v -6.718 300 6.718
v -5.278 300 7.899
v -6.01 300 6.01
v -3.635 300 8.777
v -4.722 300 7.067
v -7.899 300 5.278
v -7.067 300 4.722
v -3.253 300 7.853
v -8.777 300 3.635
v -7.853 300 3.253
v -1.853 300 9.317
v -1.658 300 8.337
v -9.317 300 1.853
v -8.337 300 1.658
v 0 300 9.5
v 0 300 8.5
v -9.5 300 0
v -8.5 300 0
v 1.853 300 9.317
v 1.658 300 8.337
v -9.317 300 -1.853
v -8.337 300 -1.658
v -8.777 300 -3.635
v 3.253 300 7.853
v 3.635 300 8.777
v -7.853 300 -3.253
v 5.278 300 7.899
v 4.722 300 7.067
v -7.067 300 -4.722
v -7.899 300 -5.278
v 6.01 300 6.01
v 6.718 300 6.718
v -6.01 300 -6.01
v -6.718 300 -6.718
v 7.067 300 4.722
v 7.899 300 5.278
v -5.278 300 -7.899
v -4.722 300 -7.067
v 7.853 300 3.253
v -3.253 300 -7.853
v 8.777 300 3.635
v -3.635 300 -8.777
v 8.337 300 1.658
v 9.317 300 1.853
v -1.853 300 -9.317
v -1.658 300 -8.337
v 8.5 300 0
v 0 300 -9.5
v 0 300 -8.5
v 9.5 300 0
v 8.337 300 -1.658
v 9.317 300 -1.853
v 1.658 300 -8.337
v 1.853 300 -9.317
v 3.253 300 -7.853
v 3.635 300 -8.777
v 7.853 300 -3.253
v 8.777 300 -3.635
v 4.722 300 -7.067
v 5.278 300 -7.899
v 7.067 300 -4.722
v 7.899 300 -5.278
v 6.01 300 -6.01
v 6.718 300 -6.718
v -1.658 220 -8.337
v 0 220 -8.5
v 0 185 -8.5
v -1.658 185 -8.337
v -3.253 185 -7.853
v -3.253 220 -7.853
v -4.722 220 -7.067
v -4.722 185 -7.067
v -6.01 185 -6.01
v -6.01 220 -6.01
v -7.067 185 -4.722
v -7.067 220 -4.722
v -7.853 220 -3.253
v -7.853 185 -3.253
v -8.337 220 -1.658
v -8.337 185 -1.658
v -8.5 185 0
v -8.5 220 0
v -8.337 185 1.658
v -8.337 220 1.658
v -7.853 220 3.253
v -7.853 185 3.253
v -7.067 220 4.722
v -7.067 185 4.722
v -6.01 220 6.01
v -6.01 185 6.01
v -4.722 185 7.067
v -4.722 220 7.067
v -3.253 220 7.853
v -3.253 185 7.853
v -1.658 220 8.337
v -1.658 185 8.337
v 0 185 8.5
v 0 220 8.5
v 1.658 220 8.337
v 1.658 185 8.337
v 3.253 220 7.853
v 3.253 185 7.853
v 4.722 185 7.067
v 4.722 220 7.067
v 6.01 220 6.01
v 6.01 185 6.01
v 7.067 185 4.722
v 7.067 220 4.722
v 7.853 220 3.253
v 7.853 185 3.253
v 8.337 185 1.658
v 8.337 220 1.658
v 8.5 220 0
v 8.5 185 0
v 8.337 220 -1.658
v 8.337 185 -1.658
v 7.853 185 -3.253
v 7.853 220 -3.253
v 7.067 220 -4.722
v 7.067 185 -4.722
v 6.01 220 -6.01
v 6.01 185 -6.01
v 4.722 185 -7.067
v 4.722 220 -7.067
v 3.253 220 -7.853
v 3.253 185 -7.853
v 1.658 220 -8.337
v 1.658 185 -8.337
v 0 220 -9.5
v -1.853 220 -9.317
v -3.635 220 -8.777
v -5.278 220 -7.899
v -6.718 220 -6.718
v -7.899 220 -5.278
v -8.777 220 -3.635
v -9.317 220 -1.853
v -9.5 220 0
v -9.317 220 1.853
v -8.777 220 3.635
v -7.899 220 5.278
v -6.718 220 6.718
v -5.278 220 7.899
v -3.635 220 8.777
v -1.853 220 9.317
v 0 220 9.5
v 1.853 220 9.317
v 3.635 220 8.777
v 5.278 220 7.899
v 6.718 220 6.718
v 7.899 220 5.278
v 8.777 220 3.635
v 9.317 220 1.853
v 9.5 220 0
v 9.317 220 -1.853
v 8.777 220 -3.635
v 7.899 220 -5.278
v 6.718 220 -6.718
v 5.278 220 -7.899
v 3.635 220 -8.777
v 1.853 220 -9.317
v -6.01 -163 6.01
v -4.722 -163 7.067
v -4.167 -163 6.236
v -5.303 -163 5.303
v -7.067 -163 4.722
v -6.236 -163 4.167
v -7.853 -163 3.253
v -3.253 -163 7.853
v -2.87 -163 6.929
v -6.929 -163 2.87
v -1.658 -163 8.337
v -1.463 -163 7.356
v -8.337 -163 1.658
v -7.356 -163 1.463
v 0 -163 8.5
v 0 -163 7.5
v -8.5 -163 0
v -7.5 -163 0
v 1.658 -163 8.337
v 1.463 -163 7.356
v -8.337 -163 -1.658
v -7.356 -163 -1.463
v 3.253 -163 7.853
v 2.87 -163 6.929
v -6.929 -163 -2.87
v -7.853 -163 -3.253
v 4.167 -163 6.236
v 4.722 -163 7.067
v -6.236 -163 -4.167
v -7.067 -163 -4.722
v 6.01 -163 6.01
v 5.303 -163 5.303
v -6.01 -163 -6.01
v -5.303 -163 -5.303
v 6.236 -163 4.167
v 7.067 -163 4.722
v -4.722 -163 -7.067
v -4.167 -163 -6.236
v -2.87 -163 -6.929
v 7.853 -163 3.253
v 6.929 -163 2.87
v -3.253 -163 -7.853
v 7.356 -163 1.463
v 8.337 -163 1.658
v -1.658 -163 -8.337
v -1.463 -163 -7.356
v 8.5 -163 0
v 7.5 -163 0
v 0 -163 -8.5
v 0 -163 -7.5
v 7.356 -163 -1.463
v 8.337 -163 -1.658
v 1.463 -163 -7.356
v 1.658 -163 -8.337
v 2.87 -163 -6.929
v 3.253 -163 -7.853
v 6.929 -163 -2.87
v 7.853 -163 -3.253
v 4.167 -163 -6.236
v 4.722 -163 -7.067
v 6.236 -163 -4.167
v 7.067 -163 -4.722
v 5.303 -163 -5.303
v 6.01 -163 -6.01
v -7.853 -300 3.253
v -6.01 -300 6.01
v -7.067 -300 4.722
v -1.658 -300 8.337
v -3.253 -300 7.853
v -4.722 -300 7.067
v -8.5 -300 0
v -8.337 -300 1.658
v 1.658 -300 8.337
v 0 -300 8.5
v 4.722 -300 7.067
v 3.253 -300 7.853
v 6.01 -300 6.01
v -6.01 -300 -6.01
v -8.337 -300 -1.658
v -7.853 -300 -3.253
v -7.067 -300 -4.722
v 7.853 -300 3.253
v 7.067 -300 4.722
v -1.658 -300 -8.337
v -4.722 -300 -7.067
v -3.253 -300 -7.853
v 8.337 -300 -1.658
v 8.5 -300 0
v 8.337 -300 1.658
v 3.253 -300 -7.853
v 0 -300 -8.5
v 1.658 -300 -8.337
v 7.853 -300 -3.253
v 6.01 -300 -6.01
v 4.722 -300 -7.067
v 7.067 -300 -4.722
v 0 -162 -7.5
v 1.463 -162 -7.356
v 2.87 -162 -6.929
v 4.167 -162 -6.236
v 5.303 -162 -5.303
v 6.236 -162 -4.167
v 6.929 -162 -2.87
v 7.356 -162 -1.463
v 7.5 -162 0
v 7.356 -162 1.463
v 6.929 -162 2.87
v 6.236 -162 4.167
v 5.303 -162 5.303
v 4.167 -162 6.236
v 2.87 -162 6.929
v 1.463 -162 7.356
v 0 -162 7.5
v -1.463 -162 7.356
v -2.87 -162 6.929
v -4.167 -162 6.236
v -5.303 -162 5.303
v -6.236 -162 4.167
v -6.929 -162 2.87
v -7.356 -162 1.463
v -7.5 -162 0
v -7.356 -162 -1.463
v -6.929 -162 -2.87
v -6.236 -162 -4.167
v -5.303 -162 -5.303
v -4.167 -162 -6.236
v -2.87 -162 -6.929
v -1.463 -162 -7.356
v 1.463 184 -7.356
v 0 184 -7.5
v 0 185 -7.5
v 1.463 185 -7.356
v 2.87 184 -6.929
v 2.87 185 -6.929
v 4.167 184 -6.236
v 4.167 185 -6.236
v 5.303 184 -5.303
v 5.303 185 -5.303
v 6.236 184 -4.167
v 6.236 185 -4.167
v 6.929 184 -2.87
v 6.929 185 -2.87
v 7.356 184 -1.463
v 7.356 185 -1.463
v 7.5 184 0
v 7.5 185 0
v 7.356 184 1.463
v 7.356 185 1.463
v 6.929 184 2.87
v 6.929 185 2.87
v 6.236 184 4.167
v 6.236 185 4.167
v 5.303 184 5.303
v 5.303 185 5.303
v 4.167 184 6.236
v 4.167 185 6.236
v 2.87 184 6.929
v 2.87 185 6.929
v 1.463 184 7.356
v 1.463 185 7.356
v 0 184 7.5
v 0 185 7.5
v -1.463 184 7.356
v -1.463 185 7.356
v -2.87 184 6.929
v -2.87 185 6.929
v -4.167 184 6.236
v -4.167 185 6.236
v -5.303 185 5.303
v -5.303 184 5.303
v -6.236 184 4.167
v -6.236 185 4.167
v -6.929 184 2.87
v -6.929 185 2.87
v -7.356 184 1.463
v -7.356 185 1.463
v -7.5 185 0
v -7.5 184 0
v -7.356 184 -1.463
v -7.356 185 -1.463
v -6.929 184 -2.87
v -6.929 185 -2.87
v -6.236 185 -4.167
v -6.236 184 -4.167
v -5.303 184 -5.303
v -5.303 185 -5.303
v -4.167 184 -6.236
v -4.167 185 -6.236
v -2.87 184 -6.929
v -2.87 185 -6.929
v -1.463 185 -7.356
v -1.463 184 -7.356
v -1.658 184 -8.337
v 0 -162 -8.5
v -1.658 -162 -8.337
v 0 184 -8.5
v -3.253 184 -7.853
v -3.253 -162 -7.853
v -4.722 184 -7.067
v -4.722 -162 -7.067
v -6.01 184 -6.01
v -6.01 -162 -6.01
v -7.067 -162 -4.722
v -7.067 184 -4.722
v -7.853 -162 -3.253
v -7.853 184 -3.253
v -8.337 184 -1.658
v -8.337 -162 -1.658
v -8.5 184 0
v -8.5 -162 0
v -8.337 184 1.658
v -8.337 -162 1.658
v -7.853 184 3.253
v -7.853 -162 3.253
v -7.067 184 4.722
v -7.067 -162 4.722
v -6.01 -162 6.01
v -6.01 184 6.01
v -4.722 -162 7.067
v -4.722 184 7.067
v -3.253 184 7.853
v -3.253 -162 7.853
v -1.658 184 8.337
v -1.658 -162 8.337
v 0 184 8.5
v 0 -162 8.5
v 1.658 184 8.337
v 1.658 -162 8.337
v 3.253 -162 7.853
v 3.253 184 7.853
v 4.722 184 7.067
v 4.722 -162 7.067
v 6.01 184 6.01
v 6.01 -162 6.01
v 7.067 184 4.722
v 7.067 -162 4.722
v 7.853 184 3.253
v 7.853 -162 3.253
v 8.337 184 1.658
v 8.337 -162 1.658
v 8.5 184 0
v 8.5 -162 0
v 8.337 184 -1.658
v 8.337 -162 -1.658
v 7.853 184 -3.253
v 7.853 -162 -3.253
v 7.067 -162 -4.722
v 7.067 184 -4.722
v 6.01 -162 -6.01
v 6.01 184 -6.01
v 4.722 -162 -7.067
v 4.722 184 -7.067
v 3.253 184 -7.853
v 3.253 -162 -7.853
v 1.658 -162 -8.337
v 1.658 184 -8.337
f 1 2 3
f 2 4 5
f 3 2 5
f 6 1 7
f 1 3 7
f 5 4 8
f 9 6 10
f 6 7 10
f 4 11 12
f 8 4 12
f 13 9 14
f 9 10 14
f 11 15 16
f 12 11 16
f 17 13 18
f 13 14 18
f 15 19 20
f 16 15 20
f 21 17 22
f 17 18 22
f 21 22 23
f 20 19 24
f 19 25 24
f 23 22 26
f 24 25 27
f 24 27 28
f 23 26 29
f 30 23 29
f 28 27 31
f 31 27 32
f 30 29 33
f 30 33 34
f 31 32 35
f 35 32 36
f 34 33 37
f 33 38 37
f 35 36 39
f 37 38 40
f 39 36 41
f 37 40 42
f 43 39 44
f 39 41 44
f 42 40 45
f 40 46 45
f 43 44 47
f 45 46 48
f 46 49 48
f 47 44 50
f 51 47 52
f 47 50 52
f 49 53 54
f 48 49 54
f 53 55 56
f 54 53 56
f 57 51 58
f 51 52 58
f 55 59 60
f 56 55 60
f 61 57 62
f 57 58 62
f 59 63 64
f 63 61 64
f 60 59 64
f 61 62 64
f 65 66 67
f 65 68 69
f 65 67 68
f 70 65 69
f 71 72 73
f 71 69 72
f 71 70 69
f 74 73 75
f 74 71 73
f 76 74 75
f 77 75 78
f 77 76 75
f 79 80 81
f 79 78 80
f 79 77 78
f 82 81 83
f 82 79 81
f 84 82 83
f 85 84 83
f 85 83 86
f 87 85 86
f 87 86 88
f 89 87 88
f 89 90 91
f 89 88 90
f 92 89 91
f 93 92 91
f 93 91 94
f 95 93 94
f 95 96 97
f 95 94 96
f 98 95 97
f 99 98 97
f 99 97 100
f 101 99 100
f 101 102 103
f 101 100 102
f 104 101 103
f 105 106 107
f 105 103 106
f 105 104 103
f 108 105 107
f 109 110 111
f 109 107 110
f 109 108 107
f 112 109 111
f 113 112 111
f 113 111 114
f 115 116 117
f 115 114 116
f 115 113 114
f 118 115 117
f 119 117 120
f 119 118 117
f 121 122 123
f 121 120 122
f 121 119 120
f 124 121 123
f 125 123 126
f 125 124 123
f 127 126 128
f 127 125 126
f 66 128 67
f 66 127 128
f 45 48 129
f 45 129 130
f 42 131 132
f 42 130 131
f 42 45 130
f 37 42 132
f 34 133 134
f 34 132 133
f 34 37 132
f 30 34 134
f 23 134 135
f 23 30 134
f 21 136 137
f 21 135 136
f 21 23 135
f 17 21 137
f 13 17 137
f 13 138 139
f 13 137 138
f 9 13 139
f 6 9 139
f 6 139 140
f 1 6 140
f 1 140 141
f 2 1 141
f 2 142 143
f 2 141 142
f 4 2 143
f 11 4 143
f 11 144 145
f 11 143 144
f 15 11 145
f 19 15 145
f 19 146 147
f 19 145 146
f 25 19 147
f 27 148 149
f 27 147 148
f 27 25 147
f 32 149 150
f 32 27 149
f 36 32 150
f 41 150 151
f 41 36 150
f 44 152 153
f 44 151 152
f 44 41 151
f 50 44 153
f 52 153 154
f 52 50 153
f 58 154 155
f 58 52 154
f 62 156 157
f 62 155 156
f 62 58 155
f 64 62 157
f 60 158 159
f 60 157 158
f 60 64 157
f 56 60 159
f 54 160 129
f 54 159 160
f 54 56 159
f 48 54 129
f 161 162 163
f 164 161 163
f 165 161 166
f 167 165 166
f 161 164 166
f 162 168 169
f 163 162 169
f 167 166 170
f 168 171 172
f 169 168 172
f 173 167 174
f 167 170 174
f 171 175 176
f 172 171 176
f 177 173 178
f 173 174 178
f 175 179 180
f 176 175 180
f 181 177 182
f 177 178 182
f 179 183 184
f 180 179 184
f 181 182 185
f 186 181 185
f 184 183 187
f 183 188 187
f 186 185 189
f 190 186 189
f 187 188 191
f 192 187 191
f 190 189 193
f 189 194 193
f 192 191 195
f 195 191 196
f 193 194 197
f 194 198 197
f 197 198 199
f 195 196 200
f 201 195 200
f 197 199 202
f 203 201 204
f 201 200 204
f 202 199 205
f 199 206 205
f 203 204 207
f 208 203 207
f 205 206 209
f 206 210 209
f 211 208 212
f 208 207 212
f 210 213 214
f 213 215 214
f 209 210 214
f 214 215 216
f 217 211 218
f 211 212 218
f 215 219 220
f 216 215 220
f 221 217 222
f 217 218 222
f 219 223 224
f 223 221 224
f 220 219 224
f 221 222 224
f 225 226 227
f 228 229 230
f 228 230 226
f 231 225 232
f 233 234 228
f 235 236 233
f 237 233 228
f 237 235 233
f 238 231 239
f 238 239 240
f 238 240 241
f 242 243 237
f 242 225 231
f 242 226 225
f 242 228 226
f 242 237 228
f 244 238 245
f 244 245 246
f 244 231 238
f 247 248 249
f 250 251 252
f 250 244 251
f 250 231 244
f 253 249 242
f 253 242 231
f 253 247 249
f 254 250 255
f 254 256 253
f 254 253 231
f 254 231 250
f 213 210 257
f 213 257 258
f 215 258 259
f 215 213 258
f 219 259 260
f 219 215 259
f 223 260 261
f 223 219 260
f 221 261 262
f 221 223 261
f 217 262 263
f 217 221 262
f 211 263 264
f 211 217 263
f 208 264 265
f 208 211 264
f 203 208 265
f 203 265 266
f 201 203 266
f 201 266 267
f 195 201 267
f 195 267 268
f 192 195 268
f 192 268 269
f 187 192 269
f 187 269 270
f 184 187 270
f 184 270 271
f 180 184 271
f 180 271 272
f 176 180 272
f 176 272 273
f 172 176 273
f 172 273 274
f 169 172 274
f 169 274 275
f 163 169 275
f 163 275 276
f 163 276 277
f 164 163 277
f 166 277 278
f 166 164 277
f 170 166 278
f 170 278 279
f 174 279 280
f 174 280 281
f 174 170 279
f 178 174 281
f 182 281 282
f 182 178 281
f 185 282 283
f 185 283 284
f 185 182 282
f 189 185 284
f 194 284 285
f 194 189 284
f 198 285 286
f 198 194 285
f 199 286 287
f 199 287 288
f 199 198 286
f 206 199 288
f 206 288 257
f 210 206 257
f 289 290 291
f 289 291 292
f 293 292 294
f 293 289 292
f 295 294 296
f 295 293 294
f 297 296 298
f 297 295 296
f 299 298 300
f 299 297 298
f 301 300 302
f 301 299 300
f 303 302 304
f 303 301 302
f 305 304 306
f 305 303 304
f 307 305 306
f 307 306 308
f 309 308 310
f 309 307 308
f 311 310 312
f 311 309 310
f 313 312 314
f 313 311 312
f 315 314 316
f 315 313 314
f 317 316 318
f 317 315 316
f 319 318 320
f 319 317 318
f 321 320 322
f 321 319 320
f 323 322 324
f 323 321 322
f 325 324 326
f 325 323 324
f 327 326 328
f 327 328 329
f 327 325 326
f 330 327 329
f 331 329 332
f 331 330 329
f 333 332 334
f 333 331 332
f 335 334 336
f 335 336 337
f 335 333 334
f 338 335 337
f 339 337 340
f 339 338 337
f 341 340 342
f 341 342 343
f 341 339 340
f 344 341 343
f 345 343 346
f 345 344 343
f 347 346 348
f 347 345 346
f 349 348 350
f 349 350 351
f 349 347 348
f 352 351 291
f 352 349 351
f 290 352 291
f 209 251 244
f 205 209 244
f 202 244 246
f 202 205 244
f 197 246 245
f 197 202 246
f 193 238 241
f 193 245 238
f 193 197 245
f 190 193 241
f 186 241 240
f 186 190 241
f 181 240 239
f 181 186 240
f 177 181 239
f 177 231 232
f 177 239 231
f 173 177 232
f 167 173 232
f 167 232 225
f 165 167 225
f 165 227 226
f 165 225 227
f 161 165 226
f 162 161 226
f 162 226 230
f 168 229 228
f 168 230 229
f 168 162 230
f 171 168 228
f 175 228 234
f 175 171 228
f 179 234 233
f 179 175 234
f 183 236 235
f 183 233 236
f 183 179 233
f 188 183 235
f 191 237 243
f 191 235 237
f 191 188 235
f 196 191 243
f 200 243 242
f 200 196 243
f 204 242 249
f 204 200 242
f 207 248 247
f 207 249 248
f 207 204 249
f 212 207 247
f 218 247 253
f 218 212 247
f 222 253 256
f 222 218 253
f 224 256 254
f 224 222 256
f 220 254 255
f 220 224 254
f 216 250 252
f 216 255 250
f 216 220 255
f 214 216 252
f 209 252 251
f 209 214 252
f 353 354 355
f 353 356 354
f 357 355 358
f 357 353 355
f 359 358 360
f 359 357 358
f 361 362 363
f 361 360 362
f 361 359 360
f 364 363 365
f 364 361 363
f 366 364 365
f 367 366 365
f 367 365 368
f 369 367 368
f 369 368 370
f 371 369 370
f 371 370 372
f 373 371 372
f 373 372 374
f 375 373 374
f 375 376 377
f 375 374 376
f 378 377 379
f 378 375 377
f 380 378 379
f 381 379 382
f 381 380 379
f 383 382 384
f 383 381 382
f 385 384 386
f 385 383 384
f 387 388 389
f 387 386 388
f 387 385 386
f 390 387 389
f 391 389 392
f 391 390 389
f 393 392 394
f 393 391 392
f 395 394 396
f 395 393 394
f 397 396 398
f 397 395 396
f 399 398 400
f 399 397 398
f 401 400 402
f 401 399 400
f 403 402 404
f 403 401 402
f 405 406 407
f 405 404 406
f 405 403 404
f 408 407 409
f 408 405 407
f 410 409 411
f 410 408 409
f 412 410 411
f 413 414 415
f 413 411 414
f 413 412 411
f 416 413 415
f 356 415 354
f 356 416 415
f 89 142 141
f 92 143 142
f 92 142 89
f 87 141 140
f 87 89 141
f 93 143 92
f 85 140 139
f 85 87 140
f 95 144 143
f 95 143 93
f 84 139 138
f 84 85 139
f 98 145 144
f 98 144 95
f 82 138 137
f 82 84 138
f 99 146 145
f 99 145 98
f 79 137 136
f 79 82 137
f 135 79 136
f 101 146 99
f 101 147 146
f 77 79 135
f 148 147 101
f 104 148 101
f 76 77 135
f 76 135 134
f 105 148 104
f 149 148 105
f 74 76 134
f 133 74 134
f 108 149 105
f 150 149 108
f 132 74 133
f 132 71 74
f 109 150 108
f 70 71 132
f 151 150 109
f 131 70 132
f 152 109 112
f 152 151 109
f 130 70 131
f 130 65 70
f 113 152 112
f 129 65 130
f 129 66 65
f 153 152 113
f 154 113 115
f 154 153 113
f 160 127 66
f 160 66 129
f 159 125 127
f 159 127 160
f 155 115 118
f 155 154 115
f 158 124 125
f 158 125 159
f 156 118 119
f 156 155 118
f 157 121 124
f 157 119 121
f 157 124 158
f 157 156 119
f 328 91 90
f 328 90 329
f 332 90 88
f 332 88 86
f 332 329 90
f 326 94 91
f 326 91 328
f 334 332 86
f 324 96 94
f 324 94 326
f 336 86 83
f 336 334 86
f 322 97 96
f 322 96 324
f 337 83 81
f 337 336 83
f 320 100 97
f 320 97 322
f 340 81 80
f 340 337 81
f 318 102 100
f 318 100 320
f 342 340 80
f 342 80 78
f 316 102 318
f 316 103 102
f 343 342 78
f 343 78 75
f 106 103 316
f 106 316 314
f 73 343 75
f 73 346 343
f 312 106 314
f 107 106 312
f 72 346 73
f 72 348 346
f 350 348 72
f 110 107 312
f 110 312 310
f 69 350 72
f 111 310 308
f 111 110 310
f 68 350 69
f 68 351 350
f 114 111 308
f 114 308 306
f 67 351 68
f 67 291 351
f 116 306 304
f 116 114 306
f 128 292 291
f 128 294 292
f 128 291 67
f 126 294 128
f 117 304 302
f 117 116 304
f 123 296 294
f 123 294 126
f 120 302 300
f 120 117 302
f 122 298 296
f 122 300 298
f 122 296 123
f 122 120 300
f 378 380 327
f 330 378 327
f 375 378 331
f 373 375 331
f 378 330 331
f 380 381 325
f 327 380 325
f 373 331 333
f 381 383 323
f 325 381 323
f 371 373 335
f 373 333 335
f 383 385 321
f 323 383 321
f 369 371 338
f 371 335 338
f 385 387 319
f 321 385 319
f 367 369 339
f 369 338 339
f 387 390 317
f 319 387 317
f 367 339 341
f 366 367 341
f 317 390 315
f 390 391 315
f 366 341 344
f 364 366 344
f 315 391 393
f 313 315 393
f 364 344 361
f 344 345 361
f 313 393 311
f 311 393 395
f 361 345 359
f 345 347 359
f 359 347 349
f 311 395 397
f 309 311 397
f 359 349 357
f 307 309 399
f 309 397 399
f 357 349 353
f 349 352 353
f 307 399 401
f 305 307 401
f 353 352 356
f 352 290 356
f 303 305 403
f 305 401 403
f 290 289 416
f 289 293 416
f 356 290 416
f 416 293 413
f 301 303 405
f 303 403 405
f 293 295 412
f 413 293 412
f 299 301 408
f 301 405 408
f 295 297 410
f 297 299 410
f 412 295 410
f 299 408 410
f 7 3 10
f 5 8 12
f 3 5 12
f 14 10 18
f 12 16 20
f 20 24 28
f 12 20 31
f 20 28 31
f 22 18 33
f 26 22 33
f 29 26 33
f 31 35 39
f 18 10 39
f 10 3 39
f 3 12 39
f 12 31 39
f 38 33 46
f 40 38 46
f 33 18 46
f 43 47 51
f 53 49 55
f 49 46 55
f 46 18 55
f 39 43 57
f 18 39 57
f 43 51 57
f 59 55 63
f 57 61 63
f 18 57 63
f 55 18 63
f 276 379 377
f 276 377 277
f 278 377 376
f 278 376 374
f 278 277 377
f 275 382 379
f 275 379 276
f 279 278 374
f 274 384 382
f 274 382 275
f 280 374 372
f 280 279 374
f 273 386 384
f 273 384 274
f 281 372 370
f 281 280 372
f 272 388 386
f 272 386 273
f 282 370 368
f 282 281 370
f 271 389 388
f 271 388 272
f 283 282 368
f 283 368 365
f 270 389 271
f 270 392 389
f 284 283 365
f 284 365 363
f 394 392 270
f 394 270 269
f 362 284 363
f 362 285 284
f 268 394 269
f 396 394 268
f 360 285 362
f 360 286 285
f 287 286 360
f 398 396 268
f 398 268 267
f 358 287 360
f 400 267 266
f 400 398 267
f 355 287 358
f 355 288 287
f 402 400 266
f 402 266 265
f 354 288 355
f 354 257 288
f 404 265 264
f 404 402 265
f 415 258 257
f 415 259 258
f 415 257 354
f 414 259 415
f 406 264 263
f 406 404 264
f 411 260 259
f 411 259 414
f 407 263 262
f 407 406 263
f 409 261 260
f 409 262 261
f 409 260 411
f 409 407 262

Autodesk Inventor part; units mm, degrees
ref_plane "YZ Plane" through (0, 0, 0) normal (1, 0, 0) x (0, 1, 0)
ref_plane "XZ Plane" through (0, 0, 0) normal (0, 1, 0) x (-1, 0, 0)
ref_plane "XY Plane" through (0, 0, 0) normal (0, 0, 1) x (1, 0, 0)
sketch "Sketch1" plane through (0, 0, 0) normal (1, 0, 0) x (0, 1, 0)
  line L0 (300, 0) -> (-300, 0)
  line L1 (-300, 0) -> (-300, -8.5)
  line L2 (-300, -8.5) -> (-163, -8.5)
  line L3 (300, -8.5) -> (300, 0)
  line L4 (185, -8.5) -> (185, -7.5)
  line L5 (185, -7.5) -> (184, -7.5)
  line L6 (184, -7.5) -> (184, -8.5)
  line L7 (-162, -7.5) -> (-163, -7.5)
  line L8 (-163, -7.5) -> (-163, -8.5)
  line L9 (-163, -8.5) -> (-162, -8.5) construction
  line L10 (-162, -8.5) -> (-162, -7.5)
  line L11 (220, -8.5) -> (300, -8.5) construction
  line L12 (300, -8.5) -> (220, -8.5) construction
  line L13 (220, -8.5) -> (220, -9.5)
  line L14 (220, -9.5) -> (300, -9.5)
  line L15 (300, -9.5) -> (300, -8.5)
  line L16 (184, -8.5) -> (185, -8.5) construction
  line L17 (185, -8.5) -> (220, -8.5)
  line L18 (-162, -8.5) -> (184, -8.5)
  line L19 (-163, -8.5) -> (-162, -8.5) construction
  point P0 (0, 0)
  point P1 (0, 0)
  point P2 (-163, -8.5)
  point P3 (-162, -8.5)
  dimension "d0" = 600
  dimension "d1" = 8.5
  dimension "d2" = 1
  dimension "d3" = 1
  dimension "d4" = 115
  dimension "d6" = 1
  dimension "d7" = 1
  dimension "d8" = 462
  dimension "d11" = 1
  dimension "d12" = 80
revolve "Revolution1" add sketch "Sketch1" angle 360 about axis through (0, 300, 0) along (0, -1, 0)
equation "\"d6\" = d2"
equation "\"d7\" = d3"
properties part number "Вал"
